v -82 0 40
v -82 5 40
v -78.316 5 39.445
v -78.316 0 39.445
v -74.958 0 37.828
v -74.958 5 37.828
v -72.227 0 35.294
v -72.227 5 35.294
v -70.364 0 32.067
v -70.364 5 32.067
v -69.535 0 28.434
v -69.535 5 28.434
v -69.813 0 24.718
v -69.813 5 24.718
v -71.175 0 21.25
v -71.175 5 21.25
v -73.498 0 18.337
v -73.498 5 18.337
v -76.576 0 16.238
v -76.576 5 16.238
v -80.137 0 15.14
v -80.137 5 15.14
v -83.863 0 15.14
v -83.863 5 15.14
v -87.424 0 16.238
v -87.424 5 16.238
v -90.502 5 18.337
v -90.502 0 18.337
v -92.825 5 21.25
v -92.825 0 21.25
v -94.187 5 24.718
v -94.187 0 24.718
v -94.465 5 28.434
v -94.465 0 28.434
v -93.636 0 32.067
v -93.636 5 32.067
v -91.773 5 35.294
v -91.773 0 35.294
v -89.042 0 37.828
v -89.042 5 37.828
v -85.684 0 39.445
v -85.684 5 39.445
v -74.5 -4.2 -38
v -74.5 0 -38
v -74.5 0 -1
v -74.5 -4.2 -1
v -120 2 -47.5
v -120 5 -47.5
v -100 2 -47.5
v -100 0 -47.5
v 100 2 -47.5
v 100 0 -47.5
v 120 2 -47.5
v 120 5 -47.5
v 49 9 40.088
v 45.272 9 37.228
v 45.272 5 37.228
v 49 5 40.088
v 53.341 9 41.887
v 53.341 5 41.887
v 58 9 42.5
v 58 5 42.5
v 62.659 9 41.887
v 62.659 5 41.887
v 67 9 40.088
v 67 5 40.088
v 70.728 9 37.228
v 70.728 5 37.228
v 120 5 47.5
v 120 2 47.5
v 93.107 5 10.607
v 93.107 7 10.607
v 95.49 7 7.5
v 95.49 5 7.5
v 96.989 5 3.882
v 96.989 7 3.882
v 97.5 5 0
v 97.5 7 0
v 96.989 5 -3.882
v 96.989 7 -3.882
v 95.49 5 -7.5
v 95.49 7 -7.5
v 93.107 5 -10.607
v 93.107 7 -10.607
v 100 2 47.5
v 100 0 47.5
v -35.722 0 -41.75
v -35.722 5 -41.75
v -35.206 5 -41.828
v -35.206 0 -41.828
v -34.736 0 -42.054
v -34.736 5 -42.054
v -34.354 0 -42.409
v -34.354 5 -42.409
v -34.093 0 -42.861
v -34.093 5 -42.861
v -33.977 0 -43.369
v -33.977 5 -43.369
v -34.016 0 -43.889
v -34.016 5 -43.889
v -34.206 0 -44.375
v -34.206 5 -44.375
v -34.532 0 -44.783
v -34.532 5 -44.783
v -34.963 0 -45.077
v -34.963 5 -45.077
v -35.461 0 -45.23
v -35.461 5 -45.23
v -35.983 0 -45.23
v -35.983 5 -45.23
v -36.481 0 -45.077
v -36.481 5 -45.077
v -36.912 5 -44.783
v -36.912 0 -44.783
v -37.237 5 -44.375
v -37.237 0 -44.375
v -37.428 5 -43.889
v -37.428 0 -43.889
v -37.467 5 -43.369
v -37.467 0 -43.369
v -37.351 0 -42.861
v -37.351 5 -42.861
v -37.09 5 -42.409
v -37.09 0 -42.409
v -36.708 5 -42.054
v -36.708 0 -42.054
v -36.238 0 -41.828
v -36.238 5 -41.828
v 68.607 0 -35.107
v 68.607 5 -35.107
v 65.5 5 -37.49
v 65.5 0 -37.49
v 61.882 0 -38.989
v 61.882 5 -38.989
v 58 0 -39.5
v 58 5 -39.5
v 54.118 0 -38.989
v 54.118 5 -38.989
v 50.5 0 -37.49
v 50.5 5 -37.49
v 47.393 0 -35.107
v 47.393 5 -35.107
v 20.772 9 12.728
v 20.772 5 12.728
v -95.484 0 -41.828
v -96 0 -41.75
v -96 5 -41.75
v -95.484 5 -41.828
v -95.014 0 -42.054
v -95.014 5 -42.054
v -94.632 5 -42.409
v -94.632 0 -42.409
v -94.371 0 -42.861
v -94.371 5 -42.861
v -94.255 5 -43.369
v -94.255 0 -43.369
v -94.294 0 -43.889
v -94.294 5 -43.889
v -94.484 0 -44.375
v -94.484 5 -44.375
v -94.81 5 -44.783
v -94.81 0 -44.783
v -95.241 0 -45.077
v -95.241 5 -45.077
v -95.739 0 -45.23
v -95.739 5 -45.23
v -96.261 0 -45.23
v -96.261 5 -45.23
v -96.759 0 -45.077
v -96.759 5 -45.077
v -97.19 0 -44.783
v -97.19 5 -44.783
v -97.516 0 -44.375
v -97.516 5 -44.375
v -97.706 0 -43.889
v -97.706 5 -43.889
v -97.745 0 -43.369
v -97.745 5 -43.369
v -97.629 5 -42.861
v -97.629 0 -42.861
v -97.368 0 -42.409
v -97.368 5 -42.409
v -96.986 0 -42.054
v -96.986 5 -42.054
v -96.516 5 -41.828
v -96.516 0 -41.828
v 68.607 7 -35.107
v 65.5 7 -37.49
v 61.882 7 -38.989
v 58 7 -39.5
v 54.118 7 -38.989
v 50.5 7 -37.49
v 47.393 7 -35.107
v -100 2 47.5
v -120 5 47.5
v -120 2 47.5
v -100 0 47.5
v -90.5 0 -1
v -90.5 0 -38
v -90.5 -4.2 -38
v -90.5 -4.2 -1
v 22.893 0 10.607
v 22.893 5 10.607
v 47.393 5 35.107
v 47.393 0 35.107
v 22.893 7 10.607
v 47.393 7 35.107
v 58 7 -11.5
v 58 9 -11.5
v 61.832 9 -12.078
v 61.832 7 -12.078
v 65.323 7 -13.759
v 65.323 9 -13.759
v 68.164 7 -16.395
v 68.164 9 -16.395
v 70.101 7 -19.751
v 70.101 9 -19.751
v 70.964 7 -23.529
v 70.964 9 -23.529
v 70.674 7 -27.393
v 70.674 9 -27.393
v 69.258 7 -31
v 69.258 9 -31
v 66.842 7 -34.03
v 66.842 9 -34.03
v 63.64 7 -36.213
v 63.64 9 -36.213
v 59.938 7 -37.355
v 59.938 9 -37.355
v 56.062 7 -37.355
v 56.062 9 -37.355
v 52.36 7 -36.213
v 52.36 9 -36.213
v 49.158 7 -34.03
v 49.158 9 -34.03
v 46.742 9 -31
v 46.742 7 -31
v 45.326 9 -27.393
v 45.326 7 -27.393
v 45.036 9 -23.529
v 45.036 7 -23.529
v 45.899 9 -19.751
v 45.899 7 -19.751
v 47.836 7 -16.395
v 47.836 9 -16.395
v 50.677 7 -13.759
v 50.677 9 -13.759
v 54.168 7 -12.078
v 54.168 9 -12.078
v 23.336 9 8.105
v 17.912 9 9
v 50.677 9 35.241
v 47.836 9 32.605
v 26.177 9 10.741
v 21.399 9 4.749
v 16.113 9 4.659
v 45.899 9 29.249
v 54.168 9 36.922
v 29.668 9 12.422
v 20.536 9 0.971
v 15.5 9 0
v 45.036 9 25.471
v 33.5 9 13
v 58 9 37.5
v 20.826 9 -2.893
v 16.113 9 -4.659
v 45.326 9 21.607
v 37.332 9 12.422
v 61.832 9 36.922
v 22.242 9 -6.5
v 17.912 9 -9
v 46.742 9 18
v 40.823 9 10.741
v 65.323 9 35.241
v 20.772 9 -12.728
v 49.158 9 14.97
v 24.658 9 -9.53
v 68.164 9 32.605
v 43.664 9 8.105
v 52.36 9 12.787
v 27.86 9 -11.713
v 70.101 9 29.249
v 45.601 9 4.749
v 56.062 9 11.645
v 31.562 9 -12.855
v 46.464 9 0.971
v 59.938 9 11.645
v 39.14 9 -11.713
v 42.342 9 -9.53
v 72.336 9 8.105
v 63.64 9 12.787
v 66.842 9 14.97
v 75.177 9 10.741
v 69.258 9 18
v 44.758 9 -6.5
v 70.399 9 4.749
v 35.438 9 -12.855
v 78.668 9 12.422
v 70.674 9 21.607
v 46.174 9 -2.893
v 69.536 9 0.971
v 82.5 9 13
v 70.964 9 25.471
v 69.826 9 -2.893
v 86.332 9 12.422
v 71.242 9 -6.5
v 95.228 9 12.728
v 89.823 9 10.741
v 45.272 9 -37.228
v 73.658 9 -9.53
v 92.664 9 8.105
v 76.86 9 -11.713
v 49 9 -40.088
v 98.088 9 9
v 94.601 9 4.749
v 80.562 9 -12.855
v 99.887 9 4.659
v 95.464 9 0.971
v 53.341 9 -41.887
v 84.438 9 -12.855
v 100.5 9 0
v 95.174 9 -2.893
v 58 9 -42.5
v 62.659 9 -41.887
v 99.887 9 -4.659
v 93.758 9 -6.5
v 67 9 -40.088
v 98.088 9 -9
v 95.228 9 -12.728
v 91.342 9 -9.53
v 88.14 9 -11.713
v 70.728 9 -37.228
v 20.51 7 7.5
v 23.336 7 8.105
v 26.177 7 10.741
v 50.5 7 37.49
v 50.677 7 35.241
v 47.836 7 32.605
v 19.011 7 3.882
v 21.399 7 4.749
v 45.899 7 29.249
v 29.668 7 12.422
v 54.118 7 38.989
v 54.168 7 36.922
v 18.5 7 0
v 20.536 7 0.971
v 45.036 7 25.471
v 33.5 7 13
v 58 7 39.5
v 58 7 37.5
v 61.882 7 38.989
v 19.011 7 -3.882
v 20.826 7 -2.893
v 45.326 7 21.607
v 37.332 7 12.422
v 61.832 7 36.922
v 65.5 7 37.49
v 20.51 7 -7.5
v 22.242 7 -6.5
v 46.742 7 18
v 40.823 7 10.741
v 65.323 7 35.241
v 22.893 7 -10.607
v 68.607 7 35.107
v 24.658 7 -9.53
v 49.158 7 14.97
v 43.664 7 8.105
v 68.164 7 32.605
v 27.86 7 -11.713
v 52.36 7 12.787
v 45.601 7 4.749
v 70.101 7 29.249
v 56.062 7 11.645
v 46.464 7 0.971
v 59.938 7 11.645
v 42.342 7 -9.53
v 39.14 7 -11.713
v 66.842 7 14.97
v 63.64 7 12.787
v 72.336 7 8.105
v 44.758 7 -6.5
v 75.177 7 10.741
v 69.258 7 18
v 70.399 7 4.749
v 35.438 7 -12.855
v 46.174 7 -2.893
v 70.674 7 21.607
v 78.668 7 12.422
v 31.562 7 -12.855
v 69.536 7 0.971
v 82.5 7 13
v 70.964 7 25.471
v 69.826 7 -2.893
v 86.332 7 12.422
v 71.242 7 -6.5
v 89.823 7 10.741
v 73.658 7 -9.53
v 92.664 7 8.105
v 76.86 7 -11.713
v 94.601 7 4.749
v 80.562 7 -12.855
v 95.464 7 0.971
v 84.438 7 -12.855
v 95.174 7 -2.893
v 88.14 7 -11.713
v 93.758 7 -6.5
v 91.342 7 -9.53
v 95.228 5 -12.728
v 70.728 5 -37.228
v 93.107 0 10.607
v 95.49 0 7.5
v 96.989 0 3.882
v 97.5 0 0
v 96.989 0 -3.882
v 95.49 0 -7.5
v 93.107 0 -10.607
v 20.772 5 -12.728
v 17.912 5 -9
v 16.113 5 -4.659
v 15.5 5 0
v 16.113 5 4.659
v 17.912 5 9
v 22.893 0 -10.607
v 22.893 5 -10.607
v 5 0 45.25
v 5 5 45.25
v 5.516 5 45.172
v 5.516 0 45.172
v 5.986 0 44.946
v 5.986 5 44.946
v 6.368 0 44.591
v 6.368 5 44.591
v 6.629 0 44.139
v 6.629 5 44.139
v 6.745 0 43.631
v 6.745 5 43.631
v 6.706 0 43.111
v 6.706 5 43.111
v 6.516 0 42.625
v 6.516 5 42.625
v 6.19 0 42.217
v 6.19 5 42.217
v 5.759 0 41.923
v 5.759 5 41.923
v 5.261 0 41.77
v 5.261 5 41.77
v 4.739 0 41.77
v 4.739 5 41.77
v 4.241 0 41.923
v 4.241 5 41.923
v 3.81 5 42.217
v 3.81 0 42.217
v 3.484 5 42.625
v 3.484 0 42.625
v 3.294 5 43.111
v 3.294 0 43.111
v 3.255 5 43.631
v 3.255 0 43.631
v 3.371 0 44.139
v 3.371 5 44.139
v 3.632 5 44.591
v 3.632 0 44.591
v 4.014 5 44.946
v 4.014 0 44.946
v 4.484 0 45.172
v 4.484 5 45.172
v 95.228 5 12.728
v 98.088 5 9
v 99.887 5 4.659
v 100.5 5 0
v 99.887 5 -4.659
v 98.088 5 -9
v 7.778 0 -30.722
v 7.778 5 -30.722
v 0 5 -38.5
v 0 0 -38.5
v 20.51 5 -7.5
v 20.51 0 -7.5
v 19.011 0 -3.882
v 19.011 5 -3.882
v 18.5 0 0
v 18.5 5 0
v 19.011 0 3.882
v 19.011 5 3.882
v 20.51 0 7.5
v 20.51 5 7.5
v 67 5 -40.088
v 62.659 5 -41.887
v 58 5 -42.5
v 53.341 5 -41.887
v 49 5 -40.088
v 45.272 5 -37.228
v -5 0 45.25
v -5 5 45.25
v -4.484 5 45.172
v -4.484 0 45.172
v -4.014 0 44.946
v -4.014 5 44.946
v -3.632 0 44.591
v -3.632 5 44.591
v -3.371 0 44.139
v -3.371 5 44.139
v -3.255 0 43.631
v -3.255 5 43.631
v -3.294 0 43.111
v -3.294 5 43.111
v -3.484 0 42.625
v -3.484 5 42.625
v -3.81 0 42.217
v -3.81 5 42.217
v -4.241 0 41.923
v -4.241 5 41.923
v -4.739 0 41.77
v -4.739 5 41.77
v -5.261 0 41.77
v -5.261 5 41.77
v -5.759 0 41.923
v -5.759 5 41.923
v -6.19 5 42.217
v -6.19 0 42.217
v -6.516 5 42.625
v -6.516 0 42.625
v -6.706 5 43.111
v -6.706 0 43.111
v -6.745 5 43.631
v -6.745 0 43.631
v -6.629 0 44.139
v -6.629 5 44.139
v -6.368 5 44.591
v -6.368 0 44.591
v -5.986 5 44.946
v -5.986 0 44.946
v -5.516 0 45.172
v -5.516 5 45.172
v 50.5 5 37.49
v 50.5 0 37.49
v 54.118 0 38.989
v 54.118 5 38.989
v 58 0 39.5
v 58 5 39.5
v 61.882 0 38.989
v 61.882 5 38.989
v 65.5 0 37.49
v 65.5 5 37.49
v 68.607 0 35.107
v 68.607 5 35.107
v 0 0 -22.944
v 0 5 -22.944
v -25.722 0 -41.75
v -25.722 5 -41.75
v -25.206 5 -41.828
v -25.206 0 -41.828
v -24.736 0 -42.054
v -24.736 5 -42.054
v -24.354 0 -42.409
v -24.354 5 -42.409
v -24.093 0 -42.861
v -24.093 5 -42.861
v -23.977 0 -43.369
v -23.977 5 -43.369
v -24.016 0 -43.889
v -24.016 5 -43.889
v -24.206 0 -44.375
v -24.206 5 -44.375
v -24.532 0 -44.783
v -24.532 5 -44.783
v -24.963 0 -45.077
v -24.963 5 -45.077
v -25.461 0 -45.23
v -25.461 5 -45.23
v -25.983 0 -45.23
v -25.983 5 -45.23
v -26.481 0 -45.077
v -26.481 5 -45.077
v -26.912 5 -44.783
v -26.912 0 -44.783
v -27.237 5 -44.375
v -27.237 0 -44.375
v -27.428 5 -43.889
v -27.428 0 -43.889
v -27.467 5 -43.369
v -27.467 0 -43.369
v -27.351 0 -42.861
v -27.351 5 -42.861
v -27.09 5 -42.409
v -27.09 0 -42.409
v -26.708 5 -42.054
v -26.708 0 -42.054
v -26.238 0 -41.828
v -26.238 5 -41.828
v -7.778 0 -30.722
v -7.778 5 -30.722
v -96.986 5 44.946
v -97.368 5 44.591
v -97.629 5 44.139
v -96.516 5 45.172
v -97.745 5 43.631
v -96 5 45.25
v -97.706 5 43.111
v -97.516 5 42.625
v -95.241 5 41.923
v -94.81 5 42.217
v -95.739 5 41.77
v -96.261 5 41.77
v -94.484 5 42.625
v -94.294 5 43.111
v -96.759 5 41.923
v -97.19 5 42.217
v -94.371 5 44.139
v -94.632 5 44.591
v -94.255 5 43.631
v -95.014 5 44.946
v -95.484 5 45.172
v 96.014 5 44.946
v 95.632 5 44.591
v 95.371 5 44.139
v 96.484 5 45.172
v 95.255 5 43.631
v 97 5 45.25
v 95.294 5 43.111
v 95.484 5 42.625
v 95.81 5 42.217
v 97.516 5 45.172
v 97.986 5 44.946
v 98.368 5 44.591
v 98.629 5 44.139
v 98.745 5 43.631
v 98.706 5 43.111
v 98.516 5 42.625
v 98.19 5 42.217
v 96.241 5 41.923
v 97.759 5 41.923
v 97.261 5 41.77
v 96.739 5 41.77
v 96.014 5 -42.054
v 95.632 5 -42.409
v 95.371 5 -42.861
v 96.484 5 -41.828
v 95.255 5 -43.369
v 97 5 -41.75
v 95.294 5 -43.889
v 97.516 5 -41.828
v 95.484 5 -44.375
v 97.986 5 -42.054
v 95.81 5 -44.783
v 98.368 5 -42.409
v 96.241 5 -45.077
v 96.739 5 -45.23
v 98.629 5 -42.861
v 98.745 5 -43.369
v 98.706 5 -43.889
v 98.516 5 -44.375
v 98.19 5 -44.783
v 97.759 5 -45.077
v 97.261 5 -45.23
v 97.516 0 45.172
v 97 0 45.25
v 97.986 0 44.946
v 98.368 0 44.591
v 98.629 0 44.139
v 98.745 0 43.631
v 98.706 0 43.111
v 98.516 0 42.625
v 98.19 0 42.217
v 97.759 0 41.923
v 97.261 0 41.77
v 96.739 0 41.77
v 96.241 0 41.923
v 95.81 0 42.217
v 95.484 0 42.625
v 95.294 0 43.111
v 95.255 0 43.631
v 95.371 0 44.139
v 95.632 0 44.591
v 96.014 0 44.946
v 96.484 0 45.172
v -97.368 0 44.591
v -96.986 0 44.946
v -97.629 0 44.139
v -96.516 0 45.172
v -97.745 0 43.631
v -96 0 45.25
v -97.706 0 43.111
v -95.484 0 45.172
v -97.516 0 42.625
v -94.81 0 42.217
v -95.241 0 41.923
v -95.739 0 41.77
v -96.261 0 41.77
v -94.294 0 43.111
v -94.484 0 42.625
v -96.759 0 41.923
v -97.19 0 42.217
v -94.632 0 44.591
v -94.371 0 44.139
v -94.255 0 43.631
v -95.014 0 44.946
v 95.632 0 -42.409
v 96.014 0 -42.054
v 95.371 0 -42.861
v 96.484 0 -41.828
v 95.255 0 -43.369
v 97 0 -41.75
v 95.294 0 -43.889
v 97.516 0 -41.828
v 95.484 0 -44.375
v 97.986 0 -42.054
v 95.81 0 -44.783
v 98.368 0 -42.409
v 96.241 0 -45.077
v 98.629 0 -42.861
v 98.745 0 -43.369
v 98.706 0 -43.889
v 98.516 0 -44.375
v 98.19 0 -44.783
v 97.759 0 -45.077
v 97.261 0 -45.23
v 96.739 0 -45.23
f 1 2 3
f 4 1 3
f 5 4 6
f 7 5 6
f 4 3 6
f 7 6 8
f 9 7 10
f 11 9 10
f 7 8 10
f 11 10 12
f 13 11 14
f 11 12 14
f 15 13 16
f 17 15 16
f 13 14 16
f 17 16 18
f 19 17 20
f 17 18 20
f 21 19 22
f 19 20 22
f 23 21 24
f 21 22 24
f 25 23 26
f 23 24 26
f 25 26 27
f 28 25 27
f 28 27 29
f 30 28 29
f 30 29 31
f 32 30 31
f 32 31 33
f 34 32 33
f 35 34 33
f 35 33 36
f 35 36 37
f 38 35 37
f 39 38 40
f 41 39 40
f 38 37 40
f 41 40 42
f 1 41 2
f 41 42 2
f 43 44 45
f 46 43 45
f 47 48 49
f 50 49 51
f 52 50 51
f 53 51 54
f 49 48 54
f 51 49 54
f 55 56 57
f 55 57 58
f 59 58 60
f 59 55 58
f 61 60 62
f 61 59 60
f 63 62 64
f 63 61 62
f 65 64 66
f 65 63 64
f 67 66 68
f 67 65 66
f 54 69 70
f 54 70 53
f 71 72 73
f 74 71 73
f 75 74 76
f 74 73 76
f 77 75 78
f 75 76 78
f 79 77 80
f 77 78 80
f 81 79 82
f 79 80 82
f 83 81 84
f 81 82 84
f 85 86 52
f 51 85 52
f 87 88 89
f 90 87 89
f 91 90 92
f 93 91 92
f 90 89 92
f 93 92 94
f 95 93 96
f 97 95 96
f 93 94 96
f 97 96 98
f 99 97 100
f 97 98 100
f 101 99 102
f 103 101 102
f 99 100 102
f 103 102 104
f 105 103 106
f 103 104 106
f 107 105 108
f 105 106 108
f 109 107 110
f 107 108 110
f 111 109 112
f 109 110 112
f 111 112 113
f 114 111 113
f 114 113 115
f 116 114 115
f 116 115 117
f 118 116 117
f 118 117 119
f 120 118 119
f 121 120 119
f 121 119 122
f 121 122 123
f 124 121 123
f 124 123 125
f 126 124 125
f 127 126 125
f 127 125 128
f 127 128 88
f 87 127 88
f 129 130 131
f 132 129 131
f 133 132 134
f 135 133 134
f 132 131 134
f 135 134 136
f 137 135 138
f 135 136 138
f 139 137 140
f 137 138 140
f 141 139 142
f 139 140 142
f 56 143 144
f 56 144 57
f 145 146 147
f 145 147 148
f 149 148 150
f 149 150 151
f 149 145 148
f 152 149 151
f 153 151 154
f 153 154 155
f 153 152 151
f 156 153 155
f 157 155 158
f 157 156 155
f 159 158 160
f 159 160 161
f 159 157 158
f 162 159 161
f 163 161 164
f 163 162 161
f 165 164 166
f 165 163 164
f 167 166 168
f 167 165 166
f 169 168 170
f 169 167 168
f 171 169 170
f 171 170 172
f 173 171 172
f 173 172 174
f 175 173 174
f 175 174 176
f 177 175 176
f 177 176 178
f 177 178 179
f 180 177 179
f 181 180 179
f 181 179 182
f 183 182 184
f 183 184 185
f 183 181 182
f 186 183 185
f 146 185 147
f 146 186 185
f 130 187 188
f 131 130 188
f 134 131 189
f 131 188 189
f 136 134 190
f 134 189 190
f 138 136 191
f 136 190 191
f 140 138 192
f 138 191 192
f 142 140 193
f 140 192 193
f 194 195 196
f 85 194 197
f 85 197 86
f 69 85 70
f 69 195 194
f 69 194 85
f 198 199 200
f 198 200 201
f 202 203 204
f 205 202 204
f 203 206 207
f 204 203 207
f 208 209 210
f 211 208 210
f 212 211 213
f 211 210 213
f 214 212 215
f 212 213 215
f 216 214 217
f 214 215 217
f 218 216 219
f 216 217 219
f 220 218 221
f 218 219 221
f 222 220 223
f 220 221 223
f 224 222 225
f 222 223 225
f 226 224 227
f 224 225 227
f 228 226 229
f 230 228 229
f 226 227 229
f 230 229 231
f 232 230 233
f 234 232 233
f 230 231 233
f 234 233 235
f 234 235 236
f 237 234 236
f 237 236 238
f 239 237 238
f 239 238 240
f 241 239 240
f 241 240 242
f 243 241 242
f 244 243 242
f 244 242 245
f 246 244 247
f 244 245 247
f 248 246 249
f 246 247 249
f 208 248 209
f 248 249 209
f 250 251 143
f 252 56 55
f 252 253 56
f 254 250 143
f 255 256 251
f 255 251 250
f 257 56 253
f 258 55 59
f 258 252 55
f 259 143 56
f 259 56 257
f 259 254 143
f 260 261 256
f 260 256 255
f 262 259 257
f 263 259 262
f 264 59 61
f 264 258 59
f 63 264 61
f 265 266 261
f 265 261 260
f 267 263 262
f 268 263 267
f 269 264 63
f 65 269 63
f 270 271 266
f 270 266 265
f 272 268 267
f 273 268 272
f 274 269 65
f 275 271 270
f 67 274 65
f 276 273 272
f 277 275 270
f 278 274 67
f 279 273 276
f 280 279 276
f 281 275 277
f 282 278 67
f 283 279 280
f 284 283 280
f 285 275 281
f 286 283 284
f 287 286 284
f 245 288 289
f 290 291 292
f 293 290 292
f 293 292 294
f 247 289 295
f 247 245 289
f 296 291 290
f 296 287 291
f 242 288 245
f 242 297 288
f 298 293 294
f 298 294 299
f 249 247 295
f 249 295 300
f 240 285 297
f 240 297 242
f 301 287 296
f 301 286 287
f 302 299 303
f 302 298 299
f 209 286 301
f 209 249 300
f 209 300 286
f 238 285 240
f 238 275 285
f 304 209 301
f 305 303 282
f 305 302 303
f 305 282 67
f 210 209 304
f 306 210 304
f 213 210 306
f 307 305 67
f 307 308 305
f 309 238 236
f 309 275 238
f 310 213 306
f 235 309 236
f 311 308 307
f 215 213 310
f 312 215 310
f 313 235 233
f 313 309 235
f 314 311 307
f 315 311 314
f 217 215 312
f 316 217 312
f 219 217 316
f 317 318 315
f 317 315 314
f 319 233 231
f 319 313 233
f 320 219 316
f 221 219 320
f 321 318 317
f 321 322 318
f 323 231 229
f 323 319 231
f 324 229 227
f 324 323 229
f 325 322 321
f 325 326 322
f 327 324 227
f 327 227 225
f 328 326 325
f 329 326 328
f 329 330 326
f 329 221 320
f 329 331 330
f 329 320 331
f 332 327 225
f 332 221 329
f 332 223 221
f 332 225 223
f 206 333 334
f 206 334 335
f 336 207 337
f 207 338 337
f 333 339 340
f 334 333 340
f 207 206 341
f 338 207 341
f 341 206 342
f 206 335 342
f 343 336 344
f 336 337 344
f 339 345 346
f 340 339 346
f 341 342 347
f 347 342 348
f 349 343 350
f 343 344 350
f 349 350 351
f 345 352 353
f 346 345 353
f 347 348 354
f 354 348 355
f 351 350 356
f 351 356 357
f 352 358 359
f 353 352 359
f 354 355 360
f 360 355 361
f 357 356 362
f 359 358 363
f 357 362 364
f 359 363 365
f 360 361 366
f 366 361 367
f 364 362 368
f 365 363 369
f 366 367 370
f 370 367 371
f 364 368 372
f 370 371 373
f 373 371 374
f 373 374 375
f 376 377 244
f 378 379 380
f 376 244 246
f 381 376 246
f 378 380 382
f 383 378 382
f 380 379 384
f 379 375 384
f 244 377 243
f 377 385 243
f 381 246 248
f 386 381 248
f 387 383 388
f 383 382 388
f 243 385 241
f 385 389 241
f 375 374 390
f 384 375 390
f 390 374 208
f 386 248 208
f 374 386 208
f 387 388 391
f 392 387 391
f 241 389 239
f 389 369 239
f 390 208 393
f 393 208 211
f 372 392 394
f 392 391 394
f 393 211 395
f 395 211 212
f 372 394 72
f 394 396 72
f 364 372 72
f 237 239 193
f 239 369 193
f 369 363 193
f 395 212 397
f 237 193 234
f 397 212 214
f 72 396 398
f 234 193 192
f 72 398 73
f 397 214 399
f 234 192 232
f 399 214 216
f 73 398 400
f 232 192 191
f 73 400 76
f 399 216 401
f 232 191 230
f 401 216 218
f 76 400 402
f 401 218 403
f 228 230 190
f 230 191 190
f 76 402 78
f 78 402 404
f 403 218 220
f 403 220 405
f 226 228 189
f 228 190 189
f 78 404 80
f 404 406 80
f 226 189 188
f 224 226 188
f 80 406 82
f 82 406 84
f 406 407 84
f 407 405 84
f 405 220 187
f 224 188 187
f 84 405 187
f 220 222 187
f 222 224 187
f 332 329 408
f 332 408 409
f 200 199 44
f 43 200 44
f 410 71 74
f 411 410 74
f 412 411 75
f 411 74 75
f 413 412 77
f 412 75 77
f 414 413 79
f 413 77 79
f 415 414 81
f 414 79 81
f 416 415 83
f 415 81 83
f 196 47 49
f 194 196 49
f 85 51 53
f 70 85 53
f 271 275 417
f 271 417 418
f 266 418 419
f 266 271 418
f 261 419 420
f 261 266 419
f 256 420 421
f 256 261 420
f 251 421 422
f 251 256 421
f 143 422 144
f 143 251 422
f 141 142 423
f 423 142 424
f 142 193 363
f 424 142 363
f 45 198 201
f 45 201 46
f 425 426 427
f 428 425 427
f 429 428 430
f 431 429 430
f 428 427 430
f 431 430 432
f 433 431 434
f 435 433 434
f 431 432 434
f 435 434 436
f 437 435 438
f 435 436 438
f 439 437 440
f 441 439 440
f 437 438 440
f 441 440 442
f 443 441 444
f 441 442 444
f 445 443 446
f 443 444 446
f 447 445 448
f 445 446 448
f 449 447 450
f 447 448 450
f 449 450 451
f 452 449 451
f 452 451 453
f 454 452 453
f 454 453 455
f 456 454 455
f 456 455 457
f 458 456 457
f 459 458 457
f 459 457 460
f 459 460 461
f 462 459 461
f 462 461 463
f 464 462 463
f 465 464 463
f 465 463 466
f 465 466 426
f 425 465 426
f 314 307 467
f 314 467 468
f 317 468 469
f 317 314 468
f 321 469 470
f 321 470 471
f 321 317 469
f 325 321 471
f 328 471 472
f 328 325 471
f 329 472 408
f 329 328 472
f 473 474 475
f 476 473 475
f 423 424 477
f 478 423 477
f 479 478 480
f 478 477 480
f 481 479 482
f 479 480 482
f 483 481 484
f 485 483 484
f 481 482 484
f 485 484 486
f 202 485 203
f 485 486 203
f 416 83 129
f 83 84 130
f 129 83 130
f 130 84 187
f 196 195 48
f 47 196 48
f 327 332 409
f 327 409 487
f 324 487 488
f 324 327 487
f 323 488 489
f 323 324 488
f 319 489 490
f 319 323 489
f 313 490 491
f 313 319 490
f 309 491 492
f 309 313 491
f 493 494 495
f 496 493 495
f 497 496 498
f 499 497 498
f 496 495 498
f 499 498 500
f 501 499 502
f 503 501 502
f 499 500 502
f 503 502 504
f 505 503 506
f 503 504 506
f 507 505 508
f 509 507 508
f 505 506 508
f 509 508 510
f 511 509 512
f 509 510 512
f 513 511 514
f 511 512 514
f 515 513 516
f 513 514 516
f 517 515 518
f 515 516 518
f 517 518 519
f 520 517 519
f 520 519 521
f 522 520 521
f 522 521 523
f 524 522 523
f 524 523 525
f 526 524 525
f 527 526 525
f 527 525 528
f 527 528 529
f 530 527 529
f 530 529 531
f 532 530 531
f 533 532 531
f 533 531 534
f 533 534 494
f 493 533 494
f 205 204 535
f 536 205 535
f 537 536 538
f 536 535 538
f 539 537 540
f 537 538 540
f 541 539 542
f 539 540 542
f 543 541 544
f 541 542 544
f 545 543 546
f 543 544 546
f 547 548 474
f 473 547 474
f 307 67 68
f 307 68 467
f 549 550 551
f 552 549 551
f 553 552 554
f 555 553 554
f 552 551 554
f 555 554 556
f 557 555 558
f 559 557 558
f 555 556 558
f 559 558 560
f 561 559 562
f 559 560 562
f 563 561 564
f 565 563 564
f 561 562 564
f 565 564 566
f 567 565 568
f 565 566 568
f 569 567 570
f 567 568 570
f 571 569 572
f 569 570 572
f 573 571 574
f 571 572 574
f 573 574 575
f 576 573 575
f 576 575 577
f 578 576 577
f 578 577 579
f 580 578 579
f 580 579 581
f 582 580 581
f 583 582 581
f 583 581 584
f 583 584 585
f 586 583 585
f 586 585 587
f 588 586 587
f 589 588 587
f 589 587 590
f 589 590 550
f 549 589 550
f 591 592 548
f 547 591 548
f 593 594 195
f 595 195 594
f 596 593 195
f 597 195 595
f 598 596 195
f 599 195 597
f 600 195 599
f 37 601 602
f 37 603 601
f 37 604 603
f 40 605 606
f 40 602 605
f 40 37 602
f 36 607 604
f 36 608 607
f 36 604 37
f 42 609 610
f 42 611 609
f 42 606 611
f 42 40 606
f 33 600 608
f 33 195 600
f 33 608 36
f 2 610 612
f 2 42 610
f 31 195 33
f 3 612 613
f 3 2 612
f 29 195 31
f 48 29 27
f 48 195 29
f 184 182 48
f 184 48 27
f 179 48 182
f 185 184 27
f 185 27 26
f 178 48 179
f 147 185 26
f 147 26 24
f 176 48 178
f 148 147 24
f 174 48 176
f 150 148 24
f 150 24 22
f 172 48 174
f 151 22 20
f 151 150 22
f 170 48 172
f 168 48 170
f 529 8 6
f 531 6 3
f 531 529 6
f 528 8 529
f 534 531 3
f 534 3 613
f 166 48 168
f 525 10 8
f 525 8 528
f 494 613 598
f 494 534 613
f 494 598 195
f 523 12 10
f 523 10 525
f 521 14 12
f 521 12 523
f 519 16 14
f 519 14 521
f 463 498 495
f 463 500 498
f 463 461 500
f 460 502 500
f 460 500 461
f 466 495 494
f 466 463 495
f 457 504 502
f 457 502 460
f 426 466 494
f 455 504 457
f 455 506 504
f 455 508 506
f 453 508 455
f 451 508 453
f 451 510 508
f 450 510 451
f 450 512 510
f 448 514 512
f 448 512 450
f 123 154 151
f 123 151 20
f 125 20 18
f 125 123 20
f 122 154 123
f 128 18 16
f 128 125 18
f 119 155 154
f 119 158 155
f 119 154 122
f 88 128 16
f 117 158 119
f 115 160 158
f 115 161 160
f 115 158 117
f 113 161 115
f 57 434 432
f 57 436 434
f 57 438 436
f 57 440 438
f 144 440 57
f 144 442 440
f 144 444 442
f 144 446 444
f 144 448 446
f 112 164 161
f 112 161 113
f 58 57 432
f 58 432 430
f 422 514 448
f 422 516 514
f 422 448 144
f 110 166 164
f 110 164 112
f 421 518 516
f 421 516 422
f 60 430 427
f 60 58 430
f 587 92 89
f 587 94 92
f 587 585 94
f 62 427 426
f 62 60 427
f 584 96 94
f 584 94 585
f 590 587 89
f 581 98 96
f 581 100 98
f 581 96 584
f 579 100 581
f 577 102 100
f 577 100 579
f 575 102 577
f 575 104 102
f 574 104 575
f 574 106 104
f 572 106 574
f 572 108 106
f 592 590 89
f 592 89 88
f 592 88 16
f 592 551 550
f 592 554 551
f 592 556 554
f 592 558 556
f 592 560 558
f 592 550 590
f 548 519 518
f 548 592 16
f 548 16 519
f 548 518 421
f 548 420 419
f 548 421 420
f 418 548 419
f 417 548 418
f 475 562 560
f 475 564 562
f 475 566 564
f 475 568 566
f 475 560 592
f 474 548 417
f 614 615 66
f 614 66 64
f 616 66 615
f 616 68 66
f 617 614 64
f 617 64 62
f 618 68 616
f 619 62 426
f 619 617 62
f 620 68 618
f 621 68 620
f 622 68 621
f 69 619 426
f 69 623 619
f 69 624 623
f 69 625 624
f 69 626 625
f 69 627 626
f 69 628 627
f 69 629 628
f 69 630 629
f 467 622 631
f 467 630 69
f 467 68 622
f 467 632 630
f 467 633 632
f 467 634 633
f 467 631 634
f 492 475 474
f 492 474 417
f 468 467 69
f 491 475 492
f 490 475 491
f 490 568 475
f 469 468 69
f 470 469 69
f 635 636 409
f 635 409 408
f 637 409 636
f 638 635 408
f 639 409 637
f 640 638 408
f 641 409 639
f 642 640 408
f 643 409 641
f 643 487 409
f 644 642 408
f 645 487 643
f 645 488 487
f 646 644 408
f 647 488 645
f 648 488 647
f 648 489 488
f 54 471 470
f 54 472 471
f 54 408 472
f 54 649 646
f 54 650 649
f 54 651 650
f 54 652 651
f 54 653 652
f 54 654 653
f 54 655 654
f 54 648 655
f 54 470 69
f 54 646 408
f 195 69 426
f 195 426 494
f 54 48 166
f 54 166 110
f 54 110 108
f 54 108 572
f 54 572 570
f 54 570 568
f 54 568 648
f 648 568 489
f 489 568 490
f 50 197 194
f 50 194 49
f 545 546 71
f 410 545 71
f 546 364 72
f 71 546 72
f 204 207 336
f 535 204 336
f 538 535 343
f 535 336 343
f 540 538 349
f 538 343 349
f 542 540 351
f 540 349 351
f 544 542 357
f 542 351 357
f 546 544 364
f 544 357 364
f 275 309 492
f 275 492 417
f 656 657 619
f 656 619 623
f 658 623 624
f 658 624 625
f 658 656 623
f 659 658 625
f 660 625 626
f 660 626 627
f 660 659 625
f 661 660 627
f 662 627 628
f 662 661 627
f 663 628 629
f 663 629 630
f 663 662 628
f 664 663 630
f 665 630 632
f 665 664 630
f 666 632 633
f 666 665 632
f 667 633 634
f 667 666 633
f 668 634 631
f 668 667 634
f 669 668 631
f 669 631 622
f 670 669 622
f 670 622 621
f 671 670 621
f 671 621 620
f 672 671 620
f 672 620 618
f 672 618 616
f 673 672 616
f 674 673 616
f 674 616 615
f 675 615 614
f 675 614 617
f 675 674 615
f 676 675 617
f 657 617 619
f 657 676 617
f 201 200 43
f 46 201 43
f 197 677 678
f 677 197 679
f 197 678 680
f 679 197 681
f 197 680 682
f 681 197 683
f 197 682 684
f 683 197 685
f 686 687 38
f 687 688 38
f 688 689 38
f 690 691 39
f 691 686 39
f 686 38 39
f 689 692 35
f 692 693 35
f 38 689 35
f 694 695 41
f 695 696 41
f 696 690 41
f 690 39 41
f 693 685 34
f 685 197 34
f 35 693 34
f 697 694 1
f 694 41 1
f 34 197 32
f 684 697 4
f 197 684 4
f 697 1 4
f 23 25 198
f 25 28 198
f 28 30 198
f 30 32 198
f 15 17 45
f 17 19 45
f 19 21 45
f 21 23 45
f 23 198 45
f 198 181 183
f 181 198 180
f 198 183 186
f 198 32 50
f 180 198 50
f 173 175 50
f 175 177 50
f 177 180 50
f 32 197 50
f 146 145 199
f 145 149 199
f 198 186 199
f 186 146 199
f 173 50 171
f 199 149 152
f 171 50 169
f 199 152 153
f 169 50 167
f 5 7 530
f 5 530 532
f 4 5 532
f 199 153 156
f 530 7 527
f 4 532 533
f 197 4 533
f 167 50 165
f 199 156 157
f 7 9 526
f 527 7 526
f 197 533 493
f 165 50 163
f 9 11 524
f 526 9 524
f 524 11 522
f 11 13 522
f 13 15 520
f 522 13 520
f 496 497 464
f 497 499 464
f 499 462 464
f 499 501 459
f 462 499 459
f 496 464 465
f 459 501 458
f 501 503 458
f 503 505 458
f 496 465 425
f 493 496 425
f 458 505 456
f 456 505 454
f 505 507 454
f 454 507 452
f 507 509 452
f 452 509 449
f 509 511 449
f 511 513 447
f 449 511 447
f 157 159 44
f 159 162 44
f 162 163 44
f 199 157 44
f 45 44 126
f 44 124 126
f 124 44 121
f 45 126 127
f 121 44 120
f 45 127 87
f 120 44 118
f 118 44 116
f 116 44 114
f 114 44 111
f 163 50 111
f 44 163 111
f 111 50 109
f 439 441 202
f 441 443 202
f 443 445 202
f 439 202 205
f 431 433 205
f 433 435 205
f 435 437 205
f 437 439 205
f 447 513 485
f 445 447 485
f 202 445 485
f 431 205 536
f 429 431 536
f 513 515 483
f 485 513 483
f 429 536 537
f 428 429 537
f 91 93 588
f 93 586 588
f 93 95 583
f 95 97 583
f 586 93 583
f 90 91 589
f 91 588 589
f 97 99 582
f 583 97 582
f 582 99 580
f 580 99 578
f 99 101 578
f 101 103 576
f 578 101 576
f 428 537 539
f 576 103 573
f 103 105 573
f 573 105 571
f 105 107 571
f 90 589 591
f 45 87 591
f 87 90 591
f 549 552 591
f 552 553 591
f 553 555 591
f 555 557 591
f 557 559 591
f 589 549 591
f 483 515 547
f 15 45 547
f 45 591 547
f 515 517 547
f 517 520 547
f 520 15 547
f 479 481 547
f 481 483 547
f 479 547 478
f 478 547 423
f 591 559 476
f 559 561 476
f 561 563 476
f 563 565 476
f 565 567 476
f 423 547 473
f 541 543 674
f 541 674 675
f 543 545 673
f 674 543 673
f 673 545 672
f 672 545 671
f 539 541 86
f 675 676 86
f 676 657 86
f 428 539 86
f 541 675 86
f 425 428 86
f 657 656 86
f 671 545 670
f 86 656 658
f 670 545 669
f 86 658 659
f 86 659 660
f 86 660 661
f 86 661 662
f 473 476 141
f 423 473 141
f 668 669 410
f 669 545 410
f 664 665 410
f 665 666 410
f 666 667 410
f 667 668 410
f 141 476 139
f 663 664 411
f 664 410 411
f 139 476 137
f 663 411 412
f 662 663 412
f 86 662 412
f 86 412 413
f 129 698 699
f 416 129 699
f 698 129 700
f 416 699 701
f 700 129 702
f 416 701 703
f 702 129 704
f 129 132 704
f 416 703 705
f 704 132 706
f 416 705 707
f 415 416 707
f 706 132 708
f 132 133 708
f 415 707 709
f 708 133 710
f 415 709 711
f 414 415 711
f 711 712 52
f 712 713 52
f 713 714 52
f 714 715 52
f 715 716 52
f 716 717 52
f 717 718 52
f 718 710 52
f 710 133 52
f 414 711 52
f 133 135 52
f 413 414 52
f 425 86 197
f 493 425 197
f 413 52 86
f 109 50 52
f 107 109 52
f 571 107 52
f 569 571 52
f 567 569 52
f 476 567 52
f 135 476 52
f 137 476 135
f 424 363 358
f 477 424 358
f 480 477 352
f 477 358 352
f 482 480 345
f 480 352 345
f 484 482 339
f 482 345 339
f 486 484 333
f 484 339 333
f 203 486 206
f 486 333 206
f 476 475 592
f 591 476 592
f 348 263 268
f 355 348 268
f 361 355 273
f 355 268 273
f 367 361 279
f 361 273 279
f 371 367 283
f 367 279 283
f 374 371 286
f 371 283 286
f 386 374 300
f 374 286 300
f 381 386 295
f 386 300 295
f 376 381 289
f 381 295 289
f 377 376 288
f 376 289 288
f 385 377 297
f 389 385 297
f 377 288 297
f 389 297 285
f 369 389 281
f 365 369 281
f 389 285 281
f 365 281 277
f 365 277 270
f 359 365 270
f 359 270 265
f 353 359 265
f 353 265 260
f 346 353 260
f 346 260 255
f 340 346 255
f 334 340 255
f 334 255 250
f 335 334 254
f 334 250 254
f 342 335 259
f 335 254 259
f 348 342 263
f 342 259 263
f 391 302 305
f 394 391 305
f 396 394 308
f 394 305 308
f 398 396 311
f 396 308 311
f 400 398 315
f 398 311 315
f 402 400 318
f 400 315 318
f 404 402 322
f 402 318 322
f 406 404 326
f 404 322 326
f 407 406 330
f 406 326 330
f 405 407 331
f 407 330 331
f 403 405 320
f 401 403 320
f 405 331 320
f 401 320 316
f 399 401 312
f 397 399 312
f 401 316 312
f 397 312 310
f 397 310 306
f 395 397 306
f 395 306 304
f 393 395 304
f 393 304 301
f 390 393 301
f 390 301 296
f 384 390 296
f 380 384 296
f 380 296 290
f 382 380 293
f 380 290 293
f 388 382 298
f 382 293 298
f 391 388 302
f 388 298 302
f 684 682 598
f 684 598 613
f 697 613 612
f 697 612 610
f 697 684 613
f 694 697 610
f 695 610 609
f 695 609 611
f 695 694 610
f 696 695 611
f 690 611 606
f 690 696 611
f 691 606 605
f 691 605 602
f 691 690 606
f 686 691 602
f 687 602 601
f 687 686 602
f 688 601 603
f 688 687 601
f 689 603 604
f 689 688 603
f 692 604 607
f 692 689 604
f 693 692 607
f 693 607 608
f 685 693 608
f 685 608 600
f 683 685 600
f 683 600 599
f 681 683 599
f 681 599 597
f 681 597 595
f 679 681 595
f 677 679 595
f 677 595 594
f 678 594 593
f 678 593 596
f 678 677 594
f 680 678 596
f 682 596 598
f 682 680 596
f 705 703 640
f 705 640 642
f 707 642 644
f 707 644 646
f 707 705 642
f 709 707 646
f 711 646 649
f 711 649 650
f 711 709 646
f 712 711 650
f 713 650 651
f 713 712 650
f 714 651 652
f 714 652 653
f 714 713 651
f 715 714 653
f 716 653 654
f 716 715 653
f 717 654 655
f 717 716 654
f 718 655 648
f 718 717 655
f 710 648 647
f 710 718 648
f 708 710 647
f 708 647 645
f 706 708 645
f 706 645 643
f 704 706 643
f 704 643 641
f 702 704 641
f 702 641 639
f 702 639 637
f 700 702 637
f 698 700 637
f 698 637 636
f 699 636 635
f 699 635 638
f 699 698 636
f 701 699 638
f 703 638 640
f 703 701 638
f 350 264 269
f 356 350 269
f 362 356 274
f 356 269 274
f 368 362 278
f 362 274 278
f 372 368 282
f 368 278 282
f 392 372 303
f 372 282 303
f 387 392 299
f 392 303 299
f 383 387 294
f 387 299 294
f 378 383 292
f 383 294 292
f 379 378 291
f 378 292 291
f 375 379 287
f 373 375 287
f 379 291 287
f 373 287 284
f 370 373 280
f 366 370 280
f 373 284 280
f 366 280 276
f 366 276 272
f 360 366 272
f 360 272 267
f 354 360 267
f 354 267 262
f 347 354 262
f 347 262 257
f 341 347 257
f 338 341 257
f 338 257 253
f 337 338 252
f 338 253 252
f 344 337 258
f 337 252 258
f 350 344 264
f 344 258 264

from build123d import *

# Parameters (mm, degrees)
SKETCH1_W           = 200
SKETCH1_H           = 95
SKETCH1_R           = 1.75
BOSS_EXTRUDE1_DEPTH = 5
SKETCH2_R           = 15
SKETCH2_R_2         = 12.5
CUT_EXTRUDE1_DEPTH  = 5
SKETCH4_W           = 16
SKETCH4_H           = 37
BOSS_EXTRUDE2_DEPTH = 4.2
SKETCH6_W           = 20
SKETCH6_H           = 95
BOSS_EXTRUDE3_DEPTH = 3
BOSS_EXTRUDE4_START = 4
BOSS_EXTRUDE4_DEPTH = 4
SKETCH9_R           = 13
BOSS_EXTRUDE5_DEPTH = 2
CUT_EXTRUDE2_DEPTH  = 5
SKETCH11_R          = 1.75
CUT_EXTRUDE3_DEPTH  = 10


with BuildPart() as part:
    # Sketch1 → Boss-Extrude1 (new body)
    with BuildSketch(Plane(origin=(0, 0, 0), x_dir=(1, 0, 0), z_dir=(0, 1, 0))):
        Rectangle(SKETCH1_W, SKETCH1_H)
        with Locations(Location((-96, 43.5, 0), (0, 0, 270))):
            Circle(SKETCH1_R, mode=Mode.SUBTRACT)
        with Locations(Location((-96, -43.5, 0), (0, 0, 270))):
            Circle(SKETCH1_R, mode=Mode.SUBTRACT)
        with Locations(Location((97, 43.5, 0), (0, 0, 270))):
            Circle(SKETCH1_R, mode=Mode.SUBTRACT)
        with Locations(Location((97, -43.5, 0), (0, 0, 270))):
            Circle(SKETCH1_R, mode=Mode.SUBTRACT)
    extrude(amount=BOSS_EXTRUDE1_DEPTH)

    # Sketch2 → Cut-Extrude1 (cut)
    with BuildSketch(Plane(origin=(0, 5, 0), x_dir=(1, 0, 0), z_dir=(0, 1, 0))):
        with Locations((33.5, 0)):
            Circle(SKETCH2_R)
        with BuildLine():
            ThreePointArc((48.5, 0), (39.240251485, -13.858192988), (22.893398282, -10.606601718))
            Line((22.893398282, -10.606601718), (47.393398282, -35.106601718))
            ThreePointArc((47.393398282, -35.106601718), (52.259748515, -10.641807012), (73, -24.5))
            ThreePointArc((73, -24.5), (71.858192988, -30.240251485), (68.606601718, -35.106601718))
            Line((68.606601718, -35.106601718), (93.106601718, -10.606601718))
            ThreePointArc((93.106601718, -10.606601718), (67.5, 0), (93.106601718, 10.606601718))
            Line((93.106601718, 10.606601718), (68.606601718, 35.106601718))
            ThreePointArc((68.606601718, 35.106601718), (71.858192988, 30.240251485), (73, 24.5))
            ThreePointArc((73, 24.5), (52.259748515, 10.641807012), (47.393398282, 35.106601718))
            Line((47.393398282, 35.106601718), (22.893398282, 10.606601718))
            ThreePointArc((22.893398282, 10.606601718), (39.240251485, 13.858192988), (48.5, 0))
        make_face()
        with Locations((58, -24.5)):
            Circle(SKETCH2_R)
        with Locations((82.5, 0)):
            Circle(SKETCH2_R)
        with Locations((58, 24.5)):
            Circle(SKETCH2_R)
        with Locations(Location((-82, -27.5, 0), (0, 0, 270))):
            Circle(SKETCH2_R_2)
    extrude(amount=-CUT_EXTRUDE1_DEPTH, mode=Mode.SUBTRACT)

    # Sketch4 → Boss-Extrude2 (add)
    with BuildSketch(Plane.XZ):
        with Locations((-82.5, -19.5)):
            Rectangle(SKETCH4_W, SKETCH4_H)
    extrude(amount=BOSS_EXTRUDE2_DEPTH)

    # Sketch6 → Boss-Extrude3 (add)
    with BuildSketch(Plane(origin=(0, 5, 0), x_dir=(1, 0, 0), z_dir=(0, 1, 0))):
        with Locations((-110, 0)):
            Rectangle(SKETCH6_W, SKETCH6_H)
        with Locations((110, 0)):
            Rectangle(SKETCH6_W, SKETCH6_H)
    extrude(amount=-BOSS_EXTRUDE3_DEPTH)

    # Sketch8 → Boss-Extrude4 (add)
    with BuildSketch(Plane(origin=(0, 5, 0), x_dir=(1, 0, 0), z_dir=(0, 1, 0)).offset(BOSS_EXTRUDE4_START)):
        with BuildLine():
            Line((70.727922061, -37.227922061), (95.227922061, -12.727922061))
            ThreePointArc((95.227922061, -12.727922061), (100.5, 0), (95.227922061, 12.727922061))
            Line((95.227922061, 12.727922061), (70.727922061, 37.227922061))
            ThreePointArc((70.727922061, 37.227922061), (58, 42.5), (45.272077939, 37.227922061))
            Line((45.272077939, 37.227922061), (20.772077939, 12.727922061))
            ThreePointArc((20.772077939, 12.727922061), (15.5, 0), (20.772077939, -12.727922061))
            Line((20.772077939, -12.727922061), (45.272077939, -37.227922061))
            ThreePointArc((45.272077939, -37.227922061), (58, -42.5), (70.727922061, -37.227922061))
        make_face()
        with BuildLine():
            Line((22.893398282, -10.606601718), (47.393398282, -35.106601718))
            ThreePointArc((47.393398282, -35.106601718), (58, -39.5), (68.606601718, -35.106601718))
            Line((68.606601718, -35.106601718), (93.106601718, -10.606601718))
            ThreePointArc((93.106601718, -10.606601718), (97.5, 0), (93.106601718, 10.606601718))
            Line((93.106601718, 10.606601718), (68.606601718, 35.106601718))
            ThreePointArc((68.606601718, 35.106601718), (58, 39.5), (47.393398282, 35.106601718))
            Line((47.393398282, 35.106601718), (22.893398282, 10.606601718))
            ThreePointArc((22.893398282, 10.606601718), (18.5, 0), (22.893398282, -10.606601718))
        make_face(mode=Mode.SUBTRACT)
    extrude(amount=-BOSS_EXTRUDE4_DEPTH)

    # Sketch9 → Boss-Extrude5 (add)
    with BuildSketch(Plane(origin=(0, 9, 0), x_dir=(1, 0, 0), z_dir=(0, 1, 0))):
        with BuildLine():
            Line((22.893398282, -10.606601718), (47.393398282, -35.106601718))
            ThreePointArc((47.393398282, -35.106601718), (58, -39.5), (68.606601718, -35.106601718))
            Line((68.606601718, -35.106601718), (93.106601718, -10.606601718))
            ThreePointArc((93.106601718, -10.606601718), (97.5, 0), (93.106601718, 10.606601718))
            Line((93.106601718, 10.606601718), (68.606601718, 35.106601718))
            ThreePointArc((68.606601718, 35.106601718), (58, 39.5), (47.393398282, 35.106601718))
            Line((47.393398282, 35.106601718), (22.893398282, 10.606601718))
            ThreePointArc((22.893398282, 10.606601718), (18.5, 0), (22.893398282, -10.606601718))
        make_face()
        with Locations(Location((58, 24.5, 0), (0, 0, 270))):
            Circle(SKETCH9_R, mode=Mode.SUBTRACT)
        with Locations(Location((82.5, 0, 0), (0, 0, 270))):
            Circle(SKETCH9_R, mode=Mode.SUBTRACT)
        with Locations(Location((58, -24.5, 0), (0, 0, 270))):
            Circle(SKETCH9_R, mode=Mode.SUBTRACT)
        with Locations(Location((33.5, 0, 0), (0, 0, 270))):
            Circle(SKETCH9_R, mode=Mode.SUBTRACT)
    extrude(amount=-BOSS_EXTRUDE5_DEPTH)

    # Sketch10 → Cut-Extrude2 (cut)
    with BuildSketch(Plane(origin=(0, 5, 0), x_dir=(1, 0, 0), z_dir=(0, 1, 0))):
        Polygon((0, 38.5), (-7.778174593, 30.721825407), (0, 22.943650814), (7.778174593, 30.721825407), align=None)
    extrude(amount=-CUT_EXTRUDE2_DEPTH, mode=Mode.SUBTRACT)

    # Sketch11 → Cut-Extrude3 (cut)
    with BuildSketch(Plane(origin=(0, 5, 0), x_dir=(1, 0, 0), z_dir=(0, 1, 0))):
        with Locations(Location((-35.721825407, 43.5, 0), (0, 0, 270))):
            Circle(SKETCH11_R)
        with Locations(Location((-25.721825407, 43.5, 0), (0, 0, 270))):
            Circle(SKETCH11_R)
        with Locations(Location((5, -43.5, 0), (0, 0, 270))):
            Circle(SKETCH11_R)
        with Locations(Location((-5, -43.5, 0), (0, 0, 270))):
            Circle(SKETCH11_R)
    extrude(amount=-CUT_EXTRUDE3_DEPTH, mode=Mode.SUBTRACT)


solid = part.part
